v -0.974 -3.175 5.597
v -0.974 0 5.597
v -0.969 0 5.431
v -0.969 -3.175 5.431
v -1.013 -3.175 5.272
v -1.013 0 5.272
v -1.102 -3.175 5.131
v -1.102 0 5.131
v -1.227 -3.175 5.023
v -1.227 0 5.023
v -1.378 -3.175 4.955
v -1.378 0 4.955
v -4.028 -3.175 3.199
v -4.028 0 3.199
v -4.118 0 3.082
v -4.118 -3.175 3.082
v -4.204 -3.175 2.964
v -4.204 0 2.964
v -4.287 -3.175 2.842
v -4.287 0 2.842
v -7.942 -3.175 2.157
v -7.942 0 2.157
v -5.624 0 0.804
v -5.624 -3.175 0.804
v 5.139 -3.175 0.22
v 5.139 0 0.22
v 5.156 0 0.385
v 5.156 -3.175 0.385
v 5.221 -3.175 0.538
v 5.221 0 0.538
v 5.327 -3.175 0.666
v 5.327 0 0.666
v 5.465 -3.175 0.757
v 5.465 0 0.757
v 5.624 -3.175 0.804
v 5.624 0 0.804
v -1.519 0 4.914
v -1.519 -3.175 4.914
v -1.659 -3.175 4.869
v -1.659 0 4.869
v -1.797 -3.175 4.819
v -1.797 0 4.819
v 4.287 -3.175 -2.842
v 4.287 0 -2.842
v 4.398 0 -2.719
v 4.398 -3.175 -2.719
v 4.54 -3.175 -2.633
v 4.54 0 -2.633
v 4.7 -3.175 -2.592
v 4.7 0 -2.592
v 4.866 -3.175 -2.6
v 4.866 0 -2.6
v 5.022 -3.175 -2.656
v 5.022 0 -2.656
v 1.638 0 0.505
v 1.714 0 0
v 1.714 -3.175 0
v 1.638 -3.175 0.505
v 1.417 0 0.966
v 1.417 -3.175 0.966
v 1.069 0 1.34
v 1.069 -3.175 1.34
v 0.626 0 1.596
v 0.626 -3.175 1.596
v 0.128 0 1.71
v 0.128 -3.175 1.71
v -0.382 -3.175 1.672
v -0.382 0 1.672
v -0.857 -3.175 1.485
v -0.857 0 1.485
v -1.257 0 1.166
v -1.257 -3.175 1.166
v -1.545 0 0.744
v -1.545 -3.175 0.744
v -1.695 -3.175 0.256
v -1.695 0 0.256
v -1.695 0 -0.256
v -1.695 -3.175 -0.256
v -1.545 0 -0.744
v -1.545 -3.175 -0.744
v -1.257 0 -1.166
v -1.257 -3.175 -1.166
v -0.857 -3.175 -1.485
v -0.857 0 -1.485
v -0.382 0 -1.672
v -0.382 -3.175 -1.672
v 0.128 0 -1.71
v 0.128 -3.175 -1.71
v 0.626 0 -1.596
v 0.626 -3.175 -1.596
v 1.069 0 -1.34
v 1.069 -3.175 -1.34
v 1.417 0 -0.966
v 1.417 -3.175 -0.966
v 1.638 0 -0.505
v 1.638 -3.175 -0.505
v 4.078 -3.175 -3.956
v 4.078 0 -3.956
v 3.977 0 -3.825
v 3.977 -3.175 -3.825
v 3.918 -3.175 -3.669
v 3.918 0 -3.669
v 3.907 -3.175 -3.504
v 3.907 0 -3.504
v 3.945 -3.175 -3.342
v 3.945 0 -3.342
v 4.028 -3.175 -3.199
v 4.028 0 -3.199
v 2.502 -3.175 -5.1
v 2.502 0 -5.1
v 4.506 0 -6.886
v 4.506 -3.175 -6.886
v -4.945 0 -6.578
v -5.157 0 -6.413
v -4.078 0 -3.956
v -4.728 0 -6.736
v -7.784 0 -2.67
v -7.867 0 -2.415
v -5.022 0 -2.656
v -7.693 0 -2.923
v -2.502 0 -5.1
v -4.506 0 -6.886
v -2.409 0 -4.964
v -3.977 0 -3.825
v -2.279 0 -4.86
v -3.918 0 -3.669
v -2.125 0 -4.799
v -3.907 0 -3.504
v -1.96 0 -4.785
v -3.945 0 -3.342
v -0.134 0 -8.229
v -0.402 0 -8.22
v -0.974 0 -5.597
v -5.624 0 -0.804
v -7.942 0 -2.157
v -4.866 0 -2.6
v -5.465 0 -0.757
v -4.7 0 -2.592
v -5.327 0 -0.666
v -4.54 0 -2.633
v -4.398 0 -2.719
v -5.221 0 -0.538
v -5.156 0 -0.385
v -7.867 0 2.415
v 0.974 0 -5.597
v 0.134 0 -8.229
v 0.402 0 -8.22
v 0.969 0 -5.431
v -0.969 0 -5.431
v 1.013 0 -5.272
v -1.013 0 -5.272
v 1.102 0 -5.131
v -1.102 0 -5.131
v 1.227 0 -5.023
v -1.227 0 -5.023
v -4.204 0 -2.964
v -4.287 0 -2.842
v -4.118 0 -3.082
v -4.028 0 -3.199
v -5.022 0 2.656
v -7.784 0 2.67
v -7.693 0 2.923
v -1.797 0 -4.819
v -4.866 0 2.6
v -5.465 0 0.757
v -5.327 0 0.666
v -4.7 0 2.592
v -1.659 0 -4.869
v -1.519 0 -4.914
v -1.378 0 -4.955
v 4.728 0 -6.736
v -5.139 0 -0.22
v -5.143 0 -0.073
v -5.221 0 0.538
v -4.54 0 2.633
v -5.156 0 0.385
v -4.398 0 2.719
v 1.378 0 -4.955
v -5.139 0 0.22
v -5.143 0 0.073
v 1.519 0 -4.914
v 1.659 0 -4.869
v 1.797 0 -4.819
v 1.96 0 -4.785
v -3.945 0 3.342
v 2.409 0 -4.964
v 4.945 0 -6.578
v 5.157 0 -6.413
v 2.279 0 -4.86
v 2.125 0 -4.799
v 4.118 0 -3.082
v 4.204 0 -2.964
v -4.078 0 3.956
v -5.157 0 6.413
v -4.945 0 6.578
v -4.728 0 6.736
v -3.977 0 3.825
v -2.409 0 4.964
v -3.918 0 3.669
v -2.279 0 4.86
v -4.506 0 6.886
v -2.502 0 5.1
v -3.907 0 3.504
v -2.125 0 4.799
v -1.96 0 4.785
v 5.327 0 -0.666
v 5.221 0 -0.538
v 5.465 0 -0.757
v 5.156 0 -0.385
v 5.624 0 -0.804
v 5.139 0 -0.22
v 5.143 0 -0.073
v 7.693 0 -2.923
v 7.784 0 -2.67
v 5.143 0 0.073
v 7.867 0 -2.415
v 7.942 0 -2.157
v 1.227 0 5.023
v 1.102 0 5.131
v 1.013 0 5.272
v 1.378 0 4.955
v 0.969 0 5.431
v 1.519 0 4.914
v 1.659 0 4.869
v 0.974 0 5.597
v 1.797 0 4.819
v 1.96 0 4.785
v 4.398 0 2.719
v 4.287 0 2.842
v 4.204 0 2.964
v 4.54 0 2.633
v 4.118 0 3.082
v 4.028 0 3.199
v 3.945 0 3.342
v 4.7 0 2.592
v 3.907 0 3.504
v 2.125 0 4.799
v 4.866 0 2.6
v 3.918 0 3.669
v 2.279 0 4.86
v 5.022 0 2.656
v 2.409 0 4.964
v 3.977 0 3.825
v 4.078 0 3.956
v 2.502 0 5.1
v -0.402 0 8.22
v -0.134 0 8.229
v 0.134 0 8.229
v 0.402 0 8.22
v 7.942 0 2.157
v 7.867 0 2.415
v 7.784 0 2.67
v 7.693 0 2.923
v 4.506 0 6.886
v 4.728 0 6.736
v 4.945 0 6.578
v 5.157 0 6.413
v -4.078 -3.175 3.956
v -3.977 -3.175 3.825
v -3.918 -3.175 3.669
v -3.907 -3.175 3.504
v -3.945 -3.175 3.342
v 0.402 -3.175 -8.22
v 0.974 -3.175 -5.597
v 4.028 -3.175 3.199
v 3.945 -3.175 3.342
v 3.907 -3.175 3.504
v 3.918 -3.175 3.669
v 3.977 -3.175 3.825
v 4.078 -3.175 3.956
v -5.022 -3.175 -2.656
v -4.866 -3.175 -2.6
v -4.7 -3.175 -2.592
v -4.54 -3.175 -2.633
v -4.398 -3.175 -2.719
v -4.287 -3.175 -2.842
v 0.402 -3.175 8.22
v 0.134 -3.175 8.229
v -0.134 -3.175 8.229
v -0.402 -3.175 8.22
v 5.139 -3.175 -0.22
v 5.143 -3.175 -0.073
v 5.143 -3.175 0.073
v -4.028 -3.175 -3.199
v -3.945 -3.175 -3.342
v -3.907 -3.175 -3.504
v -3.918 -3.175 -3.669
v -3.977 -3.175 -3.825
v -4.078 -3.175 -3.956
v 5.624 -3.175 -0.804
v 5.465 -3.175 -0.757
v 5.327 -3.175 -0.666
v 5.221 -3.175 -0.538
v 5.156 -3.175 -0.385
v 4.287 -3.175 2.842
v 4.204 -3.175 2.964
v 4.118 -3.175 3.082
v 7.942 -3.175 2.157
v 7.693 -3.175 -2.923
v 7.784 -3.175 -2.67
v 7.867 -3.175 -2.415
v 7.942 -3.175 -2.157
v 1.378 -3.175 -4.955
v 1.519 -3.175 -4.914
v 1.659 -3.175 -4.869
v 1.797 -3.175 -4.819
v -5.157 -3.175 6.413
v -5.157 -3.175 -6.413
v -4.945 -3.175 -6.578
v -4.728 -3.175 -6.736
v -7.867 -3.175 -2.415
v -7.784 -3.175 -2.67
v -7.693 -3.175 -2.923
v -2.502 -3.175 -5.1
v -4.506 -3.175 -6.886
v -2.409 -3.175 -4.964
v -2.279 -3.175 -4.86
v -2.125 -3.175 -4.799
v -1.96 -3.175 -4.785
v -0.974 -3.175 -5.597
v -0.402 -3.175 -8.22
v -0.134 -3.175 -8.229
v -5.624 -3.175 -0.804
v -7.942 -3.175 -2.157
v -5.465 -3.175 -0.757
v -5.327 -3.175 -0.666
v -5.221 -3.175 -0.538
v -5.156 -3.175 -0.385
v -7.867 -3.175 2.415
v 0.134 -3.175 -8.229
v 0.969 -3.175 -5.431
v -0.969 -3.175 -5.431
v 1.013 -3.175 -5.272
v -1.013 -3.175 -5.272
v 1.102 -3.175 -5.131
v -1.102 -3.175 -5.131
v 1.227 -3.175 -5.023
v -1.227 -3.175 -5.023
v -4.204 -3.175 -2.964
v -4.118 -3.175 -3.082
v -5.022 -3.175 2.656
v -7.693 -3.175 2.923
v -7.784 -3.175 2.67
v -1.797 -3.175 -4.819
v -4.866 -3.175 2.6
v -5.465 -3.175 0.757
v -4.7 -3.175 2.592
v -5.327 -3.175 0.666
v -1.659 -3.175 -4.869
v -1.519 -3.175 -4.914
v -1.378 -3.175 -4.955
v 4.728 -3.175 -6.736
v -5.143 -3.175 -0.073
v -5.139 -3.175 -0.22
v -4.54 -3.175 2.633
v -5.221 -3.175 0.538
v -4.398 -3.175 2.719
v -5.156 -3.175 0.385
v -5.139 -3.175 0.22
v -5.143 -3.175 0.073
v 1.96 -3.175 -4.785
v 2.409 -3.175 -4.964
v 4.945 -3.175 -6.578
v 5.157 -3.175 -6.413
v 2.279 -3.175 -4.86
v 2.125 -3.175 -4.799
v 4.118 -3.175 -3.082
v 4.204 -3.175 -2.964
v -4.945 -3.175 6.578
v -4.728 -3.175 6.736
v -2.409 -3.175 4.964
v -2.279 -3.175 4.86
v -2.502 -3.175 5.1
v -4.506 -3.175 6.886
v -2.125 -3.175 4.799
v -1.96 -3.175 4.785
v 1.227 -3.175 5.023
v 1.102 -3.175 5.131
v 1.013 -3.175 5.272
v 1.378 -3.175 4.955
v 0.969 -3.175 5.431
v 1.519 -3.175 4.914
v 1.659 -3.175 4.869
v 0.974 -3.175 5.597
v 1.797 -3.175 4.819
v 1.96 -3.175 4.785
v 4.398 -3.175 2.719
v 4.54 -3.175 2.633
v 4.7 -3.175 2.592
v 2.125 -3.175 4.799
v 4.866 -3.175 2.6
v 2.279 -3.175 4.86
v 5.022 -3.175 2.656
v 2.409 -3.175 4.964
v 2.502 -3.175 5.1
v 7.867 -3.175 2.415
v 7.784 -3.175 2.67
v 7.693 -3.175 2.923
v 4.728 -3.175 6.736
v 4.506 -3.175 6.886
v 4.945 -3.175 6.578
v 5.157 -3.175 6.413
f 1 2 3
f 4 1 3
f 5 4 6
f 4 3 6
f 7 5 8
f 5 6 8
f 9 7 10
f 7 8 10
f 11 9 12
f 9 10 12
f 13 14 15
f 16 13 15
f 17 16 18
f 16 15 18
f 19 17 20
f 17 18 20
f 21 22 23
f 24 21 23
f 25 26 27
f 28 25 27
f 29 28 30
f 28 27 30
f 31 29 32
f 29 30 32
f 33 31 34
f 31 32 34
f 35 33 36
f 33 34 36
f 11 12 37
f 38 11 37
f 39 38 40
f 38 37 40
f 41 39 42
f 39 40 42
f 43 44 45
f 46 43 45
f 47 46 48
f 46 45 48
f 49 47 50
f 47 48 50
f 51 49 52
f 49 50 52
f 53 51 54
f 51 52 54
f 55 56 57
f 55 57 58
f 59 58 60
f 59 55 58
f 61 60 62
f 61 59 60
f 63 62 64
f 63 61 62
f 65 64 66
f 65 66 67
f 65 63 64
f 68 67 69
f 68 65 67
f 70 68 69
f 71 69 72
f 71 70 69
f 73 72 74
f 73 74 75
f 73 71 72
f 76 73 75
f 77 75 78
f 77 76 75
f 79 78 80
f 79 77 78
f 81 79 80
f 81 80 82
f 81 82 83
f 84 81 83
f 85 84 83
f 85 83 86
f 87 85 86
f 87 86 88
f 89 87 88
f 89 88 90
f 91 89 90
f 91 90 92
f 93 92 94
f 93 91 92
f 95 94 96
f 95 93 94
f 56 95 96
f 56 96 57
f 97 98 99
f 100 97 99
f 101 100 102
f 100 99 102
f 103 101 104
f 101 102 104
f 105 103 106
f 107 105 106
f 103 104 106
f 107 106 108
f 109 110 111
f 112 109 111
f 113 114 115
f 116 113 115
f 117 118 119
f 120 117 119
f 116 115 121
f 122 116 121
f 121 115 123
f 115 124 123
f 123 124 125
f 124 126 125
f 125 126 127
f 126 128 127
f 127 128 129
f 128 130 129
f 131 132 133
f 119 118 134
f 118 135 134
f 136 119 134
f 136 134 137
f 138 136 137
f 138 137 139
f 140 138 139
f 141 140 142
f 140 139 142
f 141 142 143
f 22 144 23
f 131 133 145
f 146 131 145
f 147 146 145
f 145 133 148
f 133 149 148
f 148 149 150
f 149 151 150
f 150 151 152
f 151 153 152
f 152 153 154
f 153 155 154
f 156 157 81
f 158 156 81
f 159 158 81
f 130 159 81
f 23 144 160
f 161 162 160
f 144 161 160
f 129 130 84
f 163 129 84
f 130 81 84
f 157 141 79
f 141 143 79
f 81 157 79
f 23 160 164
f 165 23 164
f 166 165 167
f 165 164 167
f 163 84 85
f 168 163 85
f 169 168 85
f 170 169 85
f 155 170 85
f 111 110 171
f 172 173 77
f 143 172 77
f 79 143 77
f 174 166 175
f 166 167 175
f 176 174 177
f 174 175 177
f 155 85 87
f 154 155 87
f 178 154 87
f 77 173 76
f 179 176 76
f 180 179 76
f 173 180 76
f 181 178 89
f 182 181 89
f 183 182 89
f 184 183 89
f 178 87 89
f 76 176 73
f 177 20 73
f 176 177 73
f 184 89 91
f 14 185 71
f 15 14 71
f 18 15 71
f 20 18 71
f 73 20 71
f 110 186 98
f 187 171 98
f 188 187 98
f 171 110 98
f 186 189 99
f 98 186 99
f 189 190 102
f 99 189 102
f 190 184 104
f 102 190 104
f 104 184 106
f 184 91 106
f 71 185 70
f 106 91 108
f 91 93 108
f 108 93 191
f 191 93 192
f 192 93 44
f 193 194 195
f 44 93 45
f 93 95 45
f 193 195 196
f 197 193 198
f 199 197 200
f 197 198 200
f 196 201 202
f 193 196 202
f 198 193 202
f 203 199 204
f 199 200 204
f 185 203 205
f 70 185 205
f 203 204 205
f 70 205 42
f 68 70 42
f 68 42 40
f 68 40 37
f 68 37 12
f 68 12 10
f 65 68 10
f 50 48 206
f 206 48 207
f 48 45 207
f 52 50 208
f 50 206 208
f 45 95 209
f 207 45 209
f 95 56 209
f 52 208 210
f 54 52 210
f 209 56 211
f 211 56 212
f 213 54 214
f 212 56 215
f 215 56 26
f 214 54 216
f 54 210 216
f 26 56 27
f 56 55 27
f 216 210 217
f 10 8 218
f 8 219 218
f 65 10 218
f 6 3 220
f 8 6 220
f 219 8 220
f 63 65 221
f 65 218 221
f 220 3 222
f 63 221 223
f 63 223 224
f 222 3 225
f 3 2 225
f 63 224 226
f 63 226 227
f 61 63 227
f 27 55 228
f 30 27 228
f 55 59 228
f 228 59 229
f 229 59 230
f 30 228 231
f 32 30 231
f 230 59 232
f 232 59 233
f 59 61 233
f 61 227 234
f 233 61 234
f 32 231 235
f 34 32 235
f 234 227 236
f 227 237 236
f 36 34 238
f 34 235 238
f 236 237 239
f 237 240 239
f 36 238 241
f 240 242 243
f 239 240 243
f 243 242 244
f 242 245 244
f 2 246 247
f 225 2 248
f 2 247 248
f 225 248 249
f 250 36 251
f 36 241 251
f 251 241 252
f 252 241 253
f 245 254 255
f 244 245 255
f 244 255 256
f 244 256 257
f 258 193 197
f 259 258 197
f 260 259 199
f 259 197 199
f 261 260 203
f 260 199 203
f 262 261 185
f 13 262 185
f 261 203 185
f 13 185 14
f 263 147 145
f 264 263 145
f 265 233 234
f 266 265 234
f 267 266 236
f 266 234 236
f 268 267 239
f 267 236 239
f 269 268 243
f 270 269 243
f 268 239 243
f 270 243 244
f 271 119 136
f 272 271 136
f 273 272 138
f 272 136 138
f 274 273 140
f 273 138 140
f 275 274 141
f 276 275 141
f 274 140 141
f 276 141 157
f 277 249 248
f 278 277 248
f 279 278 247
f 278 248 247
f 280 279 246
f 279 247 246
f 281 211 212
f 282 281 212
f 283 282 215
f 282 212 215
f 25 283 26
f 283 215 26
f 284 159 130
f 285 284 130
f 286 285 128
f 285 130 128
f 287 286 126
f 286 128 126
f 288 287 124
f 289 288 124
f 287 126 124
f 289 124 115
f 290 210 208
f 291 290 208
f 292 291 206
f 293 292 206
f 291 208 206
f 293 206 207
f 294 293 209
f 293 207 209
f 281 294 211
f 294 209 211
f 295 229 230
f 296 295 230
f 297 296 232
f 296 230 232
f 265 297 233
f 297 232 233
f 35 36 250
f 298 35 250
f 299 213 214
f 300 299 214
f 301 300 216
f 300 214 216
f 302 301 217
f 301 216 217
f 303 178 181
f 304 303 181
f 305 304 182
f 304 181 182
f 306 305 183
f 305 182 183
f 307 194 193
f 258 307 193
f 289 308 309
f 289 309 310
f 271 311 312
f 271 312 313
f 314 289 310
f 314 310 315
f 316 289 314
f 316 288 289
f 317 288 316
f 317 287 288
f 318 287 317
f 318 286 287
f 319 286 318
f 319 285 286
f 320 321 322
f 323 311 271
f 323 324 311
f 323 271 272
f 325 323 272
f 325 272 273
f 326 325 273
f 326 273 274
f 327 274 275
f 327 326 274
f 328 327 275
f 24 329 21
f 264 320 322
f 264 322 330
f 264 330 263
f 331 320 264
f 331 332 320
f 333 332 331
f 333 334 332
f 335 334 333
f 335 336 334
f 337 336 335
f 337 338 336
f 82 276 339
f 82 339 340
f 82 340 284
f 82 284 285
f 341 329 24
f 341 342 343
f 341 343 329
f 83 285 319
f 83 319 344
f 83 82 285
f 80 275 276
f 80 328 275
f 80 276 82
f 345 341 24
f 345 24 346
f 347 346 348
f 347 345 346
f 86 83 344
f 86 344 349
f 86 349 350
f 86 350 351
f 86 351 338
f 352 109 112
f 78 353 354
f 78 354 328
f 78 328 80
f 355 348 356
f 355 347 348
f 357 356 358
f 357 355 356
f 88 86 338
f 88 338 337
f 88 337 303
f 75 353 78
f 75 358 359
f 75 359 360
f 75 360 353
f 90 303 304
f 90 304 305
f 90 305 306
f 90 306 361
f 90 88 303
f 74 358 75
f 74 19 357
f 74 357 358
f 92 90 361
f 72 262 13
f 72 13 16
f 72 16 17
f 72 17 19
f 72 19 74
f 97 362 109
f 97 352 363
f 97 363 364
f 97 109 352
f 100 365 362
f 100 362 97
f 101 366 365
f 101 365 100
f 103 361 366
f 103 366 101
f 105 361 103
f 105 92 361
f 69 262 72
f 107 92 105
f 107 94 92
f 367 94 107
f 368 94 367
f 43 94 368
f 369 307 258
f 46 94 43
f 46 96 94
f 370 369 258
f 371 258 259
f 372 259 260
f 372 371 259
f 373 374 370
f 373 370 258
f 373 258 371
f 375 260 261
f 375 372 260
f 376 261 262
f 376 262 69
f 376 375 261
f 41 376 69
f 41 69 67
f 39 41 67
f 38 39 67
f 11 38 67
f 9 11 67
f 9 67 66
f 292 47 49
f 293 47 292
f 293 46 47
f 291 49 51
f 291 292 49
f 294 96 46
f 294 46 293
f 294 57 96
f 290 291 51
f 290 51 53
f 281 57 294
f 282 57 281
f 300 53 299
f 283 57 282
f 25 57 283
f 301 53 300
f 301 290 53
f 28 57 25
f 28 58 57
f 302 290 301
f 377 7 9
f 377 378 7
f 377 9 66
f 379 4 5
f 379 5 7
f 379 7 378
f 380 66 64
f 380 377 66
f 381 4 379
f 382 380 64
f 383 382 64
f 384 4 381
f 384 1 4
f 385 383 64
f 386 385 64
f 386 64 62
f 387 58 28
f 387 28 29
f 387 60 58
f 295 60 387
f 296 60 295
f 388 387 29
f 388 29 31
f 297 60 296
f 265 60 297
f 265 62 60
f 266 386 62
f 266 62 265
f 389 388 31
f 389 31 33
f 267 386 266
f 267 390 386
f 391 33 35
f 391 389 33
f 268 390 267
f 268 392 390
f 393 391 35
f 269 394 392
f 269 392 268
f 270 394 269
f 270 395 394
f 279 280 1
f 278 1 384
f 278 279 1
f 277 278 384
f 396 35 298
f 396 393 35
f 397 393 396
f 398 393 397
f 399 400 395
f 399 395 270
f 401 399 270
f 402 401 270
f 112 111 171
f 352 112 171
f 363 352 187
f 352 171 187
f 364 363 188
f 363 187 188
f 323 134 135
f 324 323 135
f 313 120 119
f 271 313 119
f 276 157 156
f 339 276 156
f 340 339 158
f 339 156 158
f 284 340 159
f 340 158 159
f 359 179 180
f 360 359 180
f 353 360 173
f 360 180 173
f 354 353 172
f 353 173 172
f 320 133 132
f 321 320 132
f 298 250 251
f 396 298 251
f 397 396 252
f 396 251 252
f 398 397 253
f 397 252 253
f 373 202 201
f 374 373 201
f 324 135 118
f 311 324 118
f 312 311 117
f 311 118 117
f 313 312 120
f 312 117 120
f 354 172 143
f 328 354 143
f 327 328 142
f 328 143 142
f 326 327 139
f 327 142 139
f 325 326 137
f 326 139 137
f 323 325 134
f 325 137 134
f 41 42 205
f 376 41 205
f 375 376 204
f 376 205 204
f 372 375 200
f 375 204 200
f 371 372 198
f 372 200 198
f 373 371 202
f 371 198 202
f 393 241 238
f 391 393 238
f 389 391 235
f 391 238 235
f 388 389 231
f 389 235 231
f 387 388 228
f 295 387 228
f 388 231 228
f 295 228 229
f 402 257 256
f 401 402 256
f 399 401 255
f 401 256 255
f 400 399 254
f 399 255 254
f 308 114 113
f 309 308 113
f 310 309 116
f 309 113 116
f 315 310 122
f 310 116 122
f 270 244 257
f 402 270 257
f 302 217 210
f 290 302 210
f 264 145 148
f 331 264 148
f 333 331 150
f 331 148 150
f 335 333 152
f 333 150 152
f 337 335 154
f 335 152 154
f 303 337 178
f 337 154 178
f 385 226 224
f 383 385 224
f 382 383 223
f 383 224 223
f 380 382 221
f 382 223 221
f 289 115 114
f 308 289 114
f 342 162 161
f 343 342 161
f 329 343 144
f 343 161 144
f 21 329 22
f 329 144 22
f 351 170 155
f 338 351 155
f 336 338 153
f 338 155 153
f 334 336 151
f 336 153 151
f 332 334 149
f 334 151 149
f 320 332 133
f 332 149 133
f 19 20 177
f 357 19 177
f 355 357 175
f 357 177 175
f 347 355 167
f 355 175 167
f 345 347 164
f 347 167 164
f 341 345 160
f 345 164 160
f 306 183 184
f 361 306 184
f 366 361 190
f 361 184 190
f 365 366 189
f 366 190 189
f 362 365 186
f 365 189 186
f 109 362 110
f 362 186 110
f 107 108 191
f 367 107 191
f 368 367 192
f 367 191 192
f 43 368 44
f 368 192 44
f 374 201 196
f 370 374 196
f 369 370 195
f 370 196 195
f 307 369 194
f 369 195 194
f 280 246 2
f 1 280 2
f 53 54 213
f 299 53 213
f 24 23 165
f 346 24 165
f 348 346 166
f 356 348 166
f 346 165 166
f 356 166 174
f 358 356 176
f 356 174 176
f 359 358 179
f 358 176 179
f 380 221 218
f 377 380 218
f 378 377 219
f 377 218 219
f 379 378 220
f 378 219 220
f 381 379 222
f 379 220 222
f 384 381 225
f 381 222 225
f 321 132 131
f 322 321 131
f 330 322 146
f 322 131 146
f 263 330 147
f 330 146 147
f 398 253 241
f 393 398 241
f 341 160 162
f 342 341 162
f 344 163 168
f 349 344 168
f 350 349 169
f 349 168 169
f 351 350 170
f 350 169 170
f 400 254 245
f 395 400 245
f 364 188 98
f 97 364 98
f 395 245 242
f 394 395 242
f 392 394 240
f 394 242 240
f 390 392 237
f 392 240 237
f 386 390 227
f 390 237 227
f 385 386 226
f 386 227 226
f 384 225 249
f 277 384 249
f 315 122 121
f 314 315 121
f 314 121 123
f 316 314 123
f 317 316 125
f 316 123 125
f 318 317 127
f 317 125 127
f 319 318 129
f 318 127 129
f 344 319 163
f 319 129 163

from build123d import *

# Parameters (mm, degrees)
F0_R     = 1.7145
F1_DEPTH = 3.175


with BuildPart() as f1:
    # F0 (on Front) → F1 (new body)
    with BuildSketch(Plane.XZ):
        with BuildLine():
            Line((0.97351, 5.597247), (0.402457, 8.219753))
            ThreePointArc((0.402457, 8.219753), (0, 8.2296), (-0.402457, 8.219753))
            Line((-0.402457, 8.219753), (-0.97351, 5.597247))
            ThreePointArc((-0.97351, 5.597247), (-1.052103, 5.198153), (-1.378445, 4.955349))
            ThreePointArc((-1.378445, 4.955349), (-1.589429, 4.891759), (-1.797496, 4.819191))
            ThreePointArc((-1.797496, 4.819191), (-2.204228, 4.823805), (-2.502393, 5.100483))
            Line((-2.502393, 5.100483), (-4.505855, 6.886478))
            ThreePointArc((-4.505855, 6.886478), (-4.837238, 6.657886), (-5.157044, 6.413362))
            Line((-5.157044, 6.413362), (-4.077565, 3.956053))
            ThreePointArc((-4.077565, 3.956053), (-3.906567, 3.586983), (-4.027866, 3.198732))
            ThreePointArc((-4.027866, 3.198732), (-4.161179, 3.023273), (-4.286854, 2.842266))
            ThreePointArc((-4.286854, 2.842266), (-4.618619, 2.606927), (-5.022467, 2.655508))
            Line((-5.022467, 2.655508), (-7.693084, 2.922803))
            ThreePointArc((-7.693084, 2.922803), (-7.826815, 2.543086), (-7.941816, 2.157284))
            Line((-7.941816, 2.157284), (-5.624129, 0.803781))
            ThreePointArc((-5.624129, 0.803781), (-5.268855, 0.605708), (-5.13878, 0.220308))
            ThreePointArc((-5.13878, 0.220308), (-5.1435, 0), (-5.13878, -0.220308))
            ThreePointArc((-5.13878, -0.220308), (-5.268855, -0.605708), (-5.624129, -0.803781))
            Line((-5.624129, -0.803781), (-7.941816, -2.157284))
            ThreePointArc((-7.941816, -2.157284), (-7.826815, -2.543086), (-7.693084, -2.922803))
            Line((-7.693084, -2.922803), (-5.022467, -2.655508))
            ThreePointArc((-5.022467, -2.655508), (-4.618619, -2.606927), (-4.286854, -2.842266))
            ThreePointArc((-4.286854, -2.842266), (-4.161179, -3.023273), (-4.027866, -3.198732))
            ThreePointArc((-4.027866, -3.198732), (-3.906567, -3.586983), (-4.077565, -3.956053))
            Line((-4.077565, -3.956053), (-5.157044, -6.413362))
            ThreePointArc((-5.157044, -6.413362), (-4.837238, -6.657886), (-4.505855, -6.886478))
            Line((-4.505855, -6.886478), (-2.502393, -5.100483))
            ThreePointArc((-2.502393, -5.100483), (-2.204228, -4.823805), (-1.797496, -4.819191))
            ThreePointArc((-1.797496, -4.819191), (-1.589429, -4.891759), (-1.378445, -4.955349))
            ThreePointArc((-1.378445, -4.955349), (-1.052103, -5.198153), (-0.97351, -5.597247))
            Line((-0.97351, -5.597247), (-0.402457, -8.219753))
            ThreePointArc((-0.402457, -8.219753), (0, -8.2296), (0.402457, -8.219753))
            Line((0.402457, -8.219753), (0.97351, -5.597247))
            ThreePointArc((0.97351, -5.597247), (1.052103, -5.198153), (1.378445, -4.955349))
            ThreePointArc((1.378445, -4.955349), (1.589429, -4.891759), (1.797496, -4.819191))
            ThreePointArc((1.797496, -4.819191), (2.204228, -4.823805), (2.502393, -5.100483))
            Line((2.502393, -5.100483), (4.505855, -6.886478))
            ThreePointArc((4.505855, -6.886478), (4.837238, -6.657886), (5.157044, -6.413362))
            Line((5.157044, -6.413362), (4.077565, -3.956053))
            ThreePointArc((4.077565, -3.956053), (3.906567, -3.586983), (4.027866, -3.198732))
            ThreePointArc((4.027866, -3.198732), (4.161179, -3.023273), (4.286854, -2.842266))
            ThreePointArc((4.286854, -2.842266), (4.618619, -2.606927), (5.022467, -2.655508))
            Line((5.022467, -2.655508), (7.693084, -2.922803))
            ThreePointArc((7.693084, -2.922803), (7.826815, -2.543086), (7.941816, -2.157284))
            Line((7.941816, -2.157284), (5.624129, -0.803781))
            ThreePointArc((5.624129, -0.803781), (5.268855, -0.605708), (5.13878, -0.220308))
            ThreePointArc((5.13878, -0.220308), (5.1435, 0), (5.13878, 0.220308))
            ThreePointArc((5.13878, 0.220308), (5.268855, 0.605708), (5.624129, 0.803781))
            Line((5.624129, 0.803781), (7.941816, 2.157284))
            ThreePointArc((7.941816, 2.157284), (7.826815, 2.543086), (7.693084, 2.922803))
            Line((7.693084, 2.922803), (5.022467, 2.655508))
            ThreePointArc((5.022467, 2.655508), (4.618619, 2.606927), (4.286854, 2.842266))
            ThreePointArc((4.286854, 2.842266), (4.161179, 3.023273), (4.027866, 3.198732))
            ThreePointArc((4.027866, 3.198732), (3.906567, 3.586983), (4.077565, 3.956053))
            Line((4.077565, 3.956053), (5.157044, 6.413362))
            ThreePointArc((5.157044, 6.413362), (4.837238, 6.657886), (4.505855, 6.886478))
            Line((4.505855, 6.886478), (2.502393, 5.100483))
            ThreePointArc((2.502393, 5.100483), (2.204228, 4.823805), (1.797496, 4.819191))
            ThreePointArc((1.797496, 4.819191), (1.589429, 4.891759), (1.378445, 4.955349))
            ThreePointArc((1.378445, 4.955349), (1.052103, 5.198153), (0.97351, 5.597247))
        make_face()
        Circle(F0_R, mode=Mode.SUBTRACT)
    extrude(amount=F1_DEPTH)


solid = f1.part
